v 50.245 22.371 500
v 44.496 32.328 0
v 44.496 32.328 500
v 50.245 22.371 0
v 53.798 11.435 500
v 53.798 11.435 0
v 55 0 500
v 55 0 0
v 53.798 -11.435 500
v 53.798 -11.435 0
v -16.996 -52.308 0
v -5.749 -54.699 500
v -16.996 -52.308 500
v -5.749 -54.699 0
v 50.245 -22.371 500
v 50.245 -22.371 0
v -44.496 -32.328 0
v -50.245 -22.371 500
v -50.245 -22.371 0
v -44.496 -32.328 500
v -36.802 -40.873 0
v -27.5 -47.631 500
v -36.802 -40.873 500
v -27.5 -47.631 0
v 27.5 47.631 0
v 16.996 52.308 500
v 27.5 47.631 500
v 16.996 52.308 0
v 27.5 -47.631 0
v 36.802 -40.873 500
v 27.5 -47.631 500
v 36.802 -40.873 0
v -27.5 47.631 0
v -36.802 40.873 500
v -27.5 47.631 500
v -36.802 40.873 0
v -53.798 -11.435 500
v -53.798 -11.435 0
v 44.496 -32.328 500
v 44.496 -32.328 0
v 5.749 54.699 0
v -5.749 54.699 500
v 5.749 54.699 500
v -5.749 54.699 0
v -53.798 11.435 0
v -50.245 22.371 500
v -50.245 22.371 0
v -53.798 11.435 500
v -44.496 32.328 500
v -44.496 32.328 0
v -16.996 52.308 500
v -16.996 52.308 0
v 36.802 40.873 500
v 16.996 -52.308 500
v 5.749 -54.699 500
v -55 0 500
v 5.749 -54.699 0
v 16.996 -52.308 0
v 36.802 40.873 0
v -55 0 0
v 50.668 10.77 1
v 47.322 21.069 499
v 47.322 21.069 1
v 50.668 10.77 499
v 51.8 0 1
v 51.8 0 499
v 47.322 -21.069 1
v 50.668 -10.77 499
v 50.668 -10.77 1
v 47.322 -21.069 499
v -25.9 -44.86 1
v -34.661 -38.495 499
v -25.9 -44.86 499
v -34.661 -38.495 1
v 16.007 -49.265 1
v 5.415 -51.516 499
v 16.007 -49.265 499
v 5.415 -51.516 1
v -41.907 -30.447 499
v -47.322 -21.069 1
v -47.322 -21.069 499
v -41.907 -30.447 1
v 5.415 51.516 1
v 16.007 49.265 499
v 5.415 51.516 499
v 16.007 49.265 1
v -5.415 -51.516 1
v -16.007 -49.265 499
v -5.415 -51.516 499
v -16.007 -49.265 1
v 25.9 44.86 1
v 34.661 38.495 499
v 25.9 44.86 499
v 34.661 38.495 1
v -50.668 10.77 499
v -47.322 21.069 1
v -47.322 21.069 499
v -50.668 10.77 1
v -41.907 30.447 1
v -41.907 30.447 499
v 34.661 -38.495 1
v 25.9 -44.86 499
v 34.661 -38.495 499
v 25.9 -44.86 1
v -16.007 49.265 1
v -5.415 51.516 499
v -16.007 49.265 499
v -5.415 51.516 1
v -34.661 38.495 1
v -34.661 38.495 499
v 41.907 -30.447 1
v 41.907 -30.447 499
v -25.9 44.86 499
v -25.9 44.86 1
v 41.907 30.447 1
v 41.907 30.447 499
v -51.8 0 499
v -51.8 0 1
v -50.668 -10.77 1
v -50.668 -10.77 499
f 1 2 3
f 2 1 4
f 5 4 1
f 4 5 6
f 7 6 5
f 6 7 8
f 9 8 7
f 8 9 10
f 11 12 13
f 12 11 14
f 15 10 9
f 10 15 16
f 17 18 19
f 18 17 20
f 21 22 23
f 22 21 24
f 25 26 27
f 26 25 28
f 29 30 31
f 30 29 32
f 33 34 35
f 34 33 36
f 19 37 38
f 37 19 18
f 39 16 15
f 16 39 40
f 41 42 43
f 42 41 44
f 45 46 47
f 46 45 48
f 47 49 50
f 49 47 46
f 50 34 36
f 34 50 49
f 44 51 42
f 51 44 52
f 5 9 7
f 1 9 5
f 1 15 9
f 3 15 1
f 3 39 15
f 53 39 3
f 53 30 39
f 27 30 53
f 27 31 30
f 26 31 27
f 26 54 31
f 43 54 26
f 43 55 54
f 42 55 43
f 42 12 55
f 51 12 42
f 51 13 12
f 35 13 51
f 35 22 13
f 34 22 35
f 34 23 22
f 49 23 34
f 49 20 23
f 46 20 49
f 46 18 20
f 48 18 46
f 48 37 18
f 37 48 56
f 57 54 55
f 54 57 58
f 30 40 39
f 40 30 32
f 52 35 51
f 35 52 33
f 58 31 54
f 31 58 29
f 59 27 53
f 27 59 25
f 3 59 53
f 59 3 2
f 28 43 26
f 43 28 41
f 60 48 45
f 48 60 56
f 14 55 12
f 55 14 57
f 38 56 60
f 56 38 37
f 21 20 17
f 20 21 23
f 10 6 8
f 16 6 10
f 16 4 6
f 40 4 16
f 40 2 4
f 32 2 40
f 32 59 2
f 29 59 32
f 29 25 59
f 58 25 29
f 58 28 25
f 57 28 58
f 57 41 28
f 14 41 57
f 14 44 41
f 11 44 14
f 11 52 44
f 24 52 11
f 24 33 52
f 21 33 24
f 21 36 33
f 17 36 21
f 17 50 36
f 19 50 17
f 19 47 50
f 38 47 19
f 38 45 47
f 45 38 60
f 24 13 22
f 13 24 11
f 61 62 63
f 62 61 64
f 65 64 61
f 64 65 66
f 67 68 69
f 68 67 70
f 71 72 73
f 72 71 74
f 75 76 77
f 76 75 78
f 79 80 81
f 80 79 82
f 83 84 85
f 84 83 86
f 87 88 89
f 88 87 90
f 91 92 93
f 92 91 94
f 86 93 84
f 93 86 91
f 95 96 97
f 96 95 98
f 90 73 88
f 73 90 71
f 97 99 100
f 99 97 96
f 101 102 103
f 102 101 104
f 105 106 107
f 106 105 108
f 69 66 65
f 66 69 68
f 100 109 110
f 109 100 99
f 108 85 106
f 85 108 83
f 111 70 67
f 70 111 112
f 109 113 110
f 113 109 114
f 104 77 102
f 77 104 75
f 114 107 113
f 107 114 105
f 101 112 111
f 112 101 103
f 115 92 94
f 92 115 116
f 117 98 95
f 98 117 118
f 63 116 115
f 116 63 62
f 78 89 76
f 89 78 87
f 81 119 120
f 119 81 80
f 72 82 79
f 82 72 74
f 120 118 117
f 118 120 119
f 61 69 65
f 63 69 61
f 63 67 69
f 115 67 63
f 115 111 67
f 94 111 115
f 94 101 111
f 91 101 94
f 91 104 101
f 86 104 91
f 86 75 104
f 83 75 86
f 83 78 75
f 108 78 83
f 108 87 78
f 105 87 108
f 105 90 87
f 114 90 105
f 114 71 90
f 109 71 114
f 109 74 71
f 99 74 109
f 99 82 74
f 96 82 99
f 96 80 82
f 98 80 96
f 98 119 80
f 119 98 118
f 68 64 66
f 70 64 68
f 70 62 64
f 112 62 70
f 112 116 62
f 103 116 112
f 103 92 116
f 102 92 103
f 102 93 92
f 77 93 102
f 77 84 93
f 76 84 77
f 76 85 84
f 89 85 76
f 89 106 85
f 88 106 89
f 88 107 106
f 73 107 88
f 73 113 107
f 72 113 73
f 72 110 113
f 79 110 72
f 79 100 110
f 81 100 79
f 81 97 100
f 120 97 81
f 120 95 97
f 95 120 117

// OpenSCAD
// Parameters
nominal_size_ht110 = 1; //[1:1:1]
length_mm = 500; //[250:1000:1]
center = 0; //[0:1:1]
ht110_outer_diameter = 110; //[90:160:0.1]
ht110_wall_thickness = 3.2; //[2:6:0.1]
epsilon_overlap = 1; //[0.5:2:0.1]
inner_diameter = ht110_outer_diameter - 2 * ht110_wall_thickness; //[80:155:0.1]

// Module for HT Pipe
module ht_pipe() {
  color([0.85, 0.85, 0.8]) { // PVC color
    // Outer cylinder
    difference() {
      cylinder(h=length_mm, r=ht110_outer_diameter/2, center=false);
      // Inner cylinder
      translate([0, 0, -epsilon_overlap])
        cylinder(h=length_mm + 2 * epsilon_overlap, r=inner_diameter/2, center=false);
    }
    // End faces
    union() {
      // Start disk
      translate([0, 0, 0])
        cylinder(h=epsilon_overlap, r=ht110_outer_diameter/2, center=false);
      // End disk
      translate([0, 0, length_mm - epsilon_overlap])
        cylinder(h=epsilon_overlap, r=ht110_outer_diameter/2, center=false);
    }
  }
}

// Assembly
module assembly() {
  ht_pipe();
}

assembly();
